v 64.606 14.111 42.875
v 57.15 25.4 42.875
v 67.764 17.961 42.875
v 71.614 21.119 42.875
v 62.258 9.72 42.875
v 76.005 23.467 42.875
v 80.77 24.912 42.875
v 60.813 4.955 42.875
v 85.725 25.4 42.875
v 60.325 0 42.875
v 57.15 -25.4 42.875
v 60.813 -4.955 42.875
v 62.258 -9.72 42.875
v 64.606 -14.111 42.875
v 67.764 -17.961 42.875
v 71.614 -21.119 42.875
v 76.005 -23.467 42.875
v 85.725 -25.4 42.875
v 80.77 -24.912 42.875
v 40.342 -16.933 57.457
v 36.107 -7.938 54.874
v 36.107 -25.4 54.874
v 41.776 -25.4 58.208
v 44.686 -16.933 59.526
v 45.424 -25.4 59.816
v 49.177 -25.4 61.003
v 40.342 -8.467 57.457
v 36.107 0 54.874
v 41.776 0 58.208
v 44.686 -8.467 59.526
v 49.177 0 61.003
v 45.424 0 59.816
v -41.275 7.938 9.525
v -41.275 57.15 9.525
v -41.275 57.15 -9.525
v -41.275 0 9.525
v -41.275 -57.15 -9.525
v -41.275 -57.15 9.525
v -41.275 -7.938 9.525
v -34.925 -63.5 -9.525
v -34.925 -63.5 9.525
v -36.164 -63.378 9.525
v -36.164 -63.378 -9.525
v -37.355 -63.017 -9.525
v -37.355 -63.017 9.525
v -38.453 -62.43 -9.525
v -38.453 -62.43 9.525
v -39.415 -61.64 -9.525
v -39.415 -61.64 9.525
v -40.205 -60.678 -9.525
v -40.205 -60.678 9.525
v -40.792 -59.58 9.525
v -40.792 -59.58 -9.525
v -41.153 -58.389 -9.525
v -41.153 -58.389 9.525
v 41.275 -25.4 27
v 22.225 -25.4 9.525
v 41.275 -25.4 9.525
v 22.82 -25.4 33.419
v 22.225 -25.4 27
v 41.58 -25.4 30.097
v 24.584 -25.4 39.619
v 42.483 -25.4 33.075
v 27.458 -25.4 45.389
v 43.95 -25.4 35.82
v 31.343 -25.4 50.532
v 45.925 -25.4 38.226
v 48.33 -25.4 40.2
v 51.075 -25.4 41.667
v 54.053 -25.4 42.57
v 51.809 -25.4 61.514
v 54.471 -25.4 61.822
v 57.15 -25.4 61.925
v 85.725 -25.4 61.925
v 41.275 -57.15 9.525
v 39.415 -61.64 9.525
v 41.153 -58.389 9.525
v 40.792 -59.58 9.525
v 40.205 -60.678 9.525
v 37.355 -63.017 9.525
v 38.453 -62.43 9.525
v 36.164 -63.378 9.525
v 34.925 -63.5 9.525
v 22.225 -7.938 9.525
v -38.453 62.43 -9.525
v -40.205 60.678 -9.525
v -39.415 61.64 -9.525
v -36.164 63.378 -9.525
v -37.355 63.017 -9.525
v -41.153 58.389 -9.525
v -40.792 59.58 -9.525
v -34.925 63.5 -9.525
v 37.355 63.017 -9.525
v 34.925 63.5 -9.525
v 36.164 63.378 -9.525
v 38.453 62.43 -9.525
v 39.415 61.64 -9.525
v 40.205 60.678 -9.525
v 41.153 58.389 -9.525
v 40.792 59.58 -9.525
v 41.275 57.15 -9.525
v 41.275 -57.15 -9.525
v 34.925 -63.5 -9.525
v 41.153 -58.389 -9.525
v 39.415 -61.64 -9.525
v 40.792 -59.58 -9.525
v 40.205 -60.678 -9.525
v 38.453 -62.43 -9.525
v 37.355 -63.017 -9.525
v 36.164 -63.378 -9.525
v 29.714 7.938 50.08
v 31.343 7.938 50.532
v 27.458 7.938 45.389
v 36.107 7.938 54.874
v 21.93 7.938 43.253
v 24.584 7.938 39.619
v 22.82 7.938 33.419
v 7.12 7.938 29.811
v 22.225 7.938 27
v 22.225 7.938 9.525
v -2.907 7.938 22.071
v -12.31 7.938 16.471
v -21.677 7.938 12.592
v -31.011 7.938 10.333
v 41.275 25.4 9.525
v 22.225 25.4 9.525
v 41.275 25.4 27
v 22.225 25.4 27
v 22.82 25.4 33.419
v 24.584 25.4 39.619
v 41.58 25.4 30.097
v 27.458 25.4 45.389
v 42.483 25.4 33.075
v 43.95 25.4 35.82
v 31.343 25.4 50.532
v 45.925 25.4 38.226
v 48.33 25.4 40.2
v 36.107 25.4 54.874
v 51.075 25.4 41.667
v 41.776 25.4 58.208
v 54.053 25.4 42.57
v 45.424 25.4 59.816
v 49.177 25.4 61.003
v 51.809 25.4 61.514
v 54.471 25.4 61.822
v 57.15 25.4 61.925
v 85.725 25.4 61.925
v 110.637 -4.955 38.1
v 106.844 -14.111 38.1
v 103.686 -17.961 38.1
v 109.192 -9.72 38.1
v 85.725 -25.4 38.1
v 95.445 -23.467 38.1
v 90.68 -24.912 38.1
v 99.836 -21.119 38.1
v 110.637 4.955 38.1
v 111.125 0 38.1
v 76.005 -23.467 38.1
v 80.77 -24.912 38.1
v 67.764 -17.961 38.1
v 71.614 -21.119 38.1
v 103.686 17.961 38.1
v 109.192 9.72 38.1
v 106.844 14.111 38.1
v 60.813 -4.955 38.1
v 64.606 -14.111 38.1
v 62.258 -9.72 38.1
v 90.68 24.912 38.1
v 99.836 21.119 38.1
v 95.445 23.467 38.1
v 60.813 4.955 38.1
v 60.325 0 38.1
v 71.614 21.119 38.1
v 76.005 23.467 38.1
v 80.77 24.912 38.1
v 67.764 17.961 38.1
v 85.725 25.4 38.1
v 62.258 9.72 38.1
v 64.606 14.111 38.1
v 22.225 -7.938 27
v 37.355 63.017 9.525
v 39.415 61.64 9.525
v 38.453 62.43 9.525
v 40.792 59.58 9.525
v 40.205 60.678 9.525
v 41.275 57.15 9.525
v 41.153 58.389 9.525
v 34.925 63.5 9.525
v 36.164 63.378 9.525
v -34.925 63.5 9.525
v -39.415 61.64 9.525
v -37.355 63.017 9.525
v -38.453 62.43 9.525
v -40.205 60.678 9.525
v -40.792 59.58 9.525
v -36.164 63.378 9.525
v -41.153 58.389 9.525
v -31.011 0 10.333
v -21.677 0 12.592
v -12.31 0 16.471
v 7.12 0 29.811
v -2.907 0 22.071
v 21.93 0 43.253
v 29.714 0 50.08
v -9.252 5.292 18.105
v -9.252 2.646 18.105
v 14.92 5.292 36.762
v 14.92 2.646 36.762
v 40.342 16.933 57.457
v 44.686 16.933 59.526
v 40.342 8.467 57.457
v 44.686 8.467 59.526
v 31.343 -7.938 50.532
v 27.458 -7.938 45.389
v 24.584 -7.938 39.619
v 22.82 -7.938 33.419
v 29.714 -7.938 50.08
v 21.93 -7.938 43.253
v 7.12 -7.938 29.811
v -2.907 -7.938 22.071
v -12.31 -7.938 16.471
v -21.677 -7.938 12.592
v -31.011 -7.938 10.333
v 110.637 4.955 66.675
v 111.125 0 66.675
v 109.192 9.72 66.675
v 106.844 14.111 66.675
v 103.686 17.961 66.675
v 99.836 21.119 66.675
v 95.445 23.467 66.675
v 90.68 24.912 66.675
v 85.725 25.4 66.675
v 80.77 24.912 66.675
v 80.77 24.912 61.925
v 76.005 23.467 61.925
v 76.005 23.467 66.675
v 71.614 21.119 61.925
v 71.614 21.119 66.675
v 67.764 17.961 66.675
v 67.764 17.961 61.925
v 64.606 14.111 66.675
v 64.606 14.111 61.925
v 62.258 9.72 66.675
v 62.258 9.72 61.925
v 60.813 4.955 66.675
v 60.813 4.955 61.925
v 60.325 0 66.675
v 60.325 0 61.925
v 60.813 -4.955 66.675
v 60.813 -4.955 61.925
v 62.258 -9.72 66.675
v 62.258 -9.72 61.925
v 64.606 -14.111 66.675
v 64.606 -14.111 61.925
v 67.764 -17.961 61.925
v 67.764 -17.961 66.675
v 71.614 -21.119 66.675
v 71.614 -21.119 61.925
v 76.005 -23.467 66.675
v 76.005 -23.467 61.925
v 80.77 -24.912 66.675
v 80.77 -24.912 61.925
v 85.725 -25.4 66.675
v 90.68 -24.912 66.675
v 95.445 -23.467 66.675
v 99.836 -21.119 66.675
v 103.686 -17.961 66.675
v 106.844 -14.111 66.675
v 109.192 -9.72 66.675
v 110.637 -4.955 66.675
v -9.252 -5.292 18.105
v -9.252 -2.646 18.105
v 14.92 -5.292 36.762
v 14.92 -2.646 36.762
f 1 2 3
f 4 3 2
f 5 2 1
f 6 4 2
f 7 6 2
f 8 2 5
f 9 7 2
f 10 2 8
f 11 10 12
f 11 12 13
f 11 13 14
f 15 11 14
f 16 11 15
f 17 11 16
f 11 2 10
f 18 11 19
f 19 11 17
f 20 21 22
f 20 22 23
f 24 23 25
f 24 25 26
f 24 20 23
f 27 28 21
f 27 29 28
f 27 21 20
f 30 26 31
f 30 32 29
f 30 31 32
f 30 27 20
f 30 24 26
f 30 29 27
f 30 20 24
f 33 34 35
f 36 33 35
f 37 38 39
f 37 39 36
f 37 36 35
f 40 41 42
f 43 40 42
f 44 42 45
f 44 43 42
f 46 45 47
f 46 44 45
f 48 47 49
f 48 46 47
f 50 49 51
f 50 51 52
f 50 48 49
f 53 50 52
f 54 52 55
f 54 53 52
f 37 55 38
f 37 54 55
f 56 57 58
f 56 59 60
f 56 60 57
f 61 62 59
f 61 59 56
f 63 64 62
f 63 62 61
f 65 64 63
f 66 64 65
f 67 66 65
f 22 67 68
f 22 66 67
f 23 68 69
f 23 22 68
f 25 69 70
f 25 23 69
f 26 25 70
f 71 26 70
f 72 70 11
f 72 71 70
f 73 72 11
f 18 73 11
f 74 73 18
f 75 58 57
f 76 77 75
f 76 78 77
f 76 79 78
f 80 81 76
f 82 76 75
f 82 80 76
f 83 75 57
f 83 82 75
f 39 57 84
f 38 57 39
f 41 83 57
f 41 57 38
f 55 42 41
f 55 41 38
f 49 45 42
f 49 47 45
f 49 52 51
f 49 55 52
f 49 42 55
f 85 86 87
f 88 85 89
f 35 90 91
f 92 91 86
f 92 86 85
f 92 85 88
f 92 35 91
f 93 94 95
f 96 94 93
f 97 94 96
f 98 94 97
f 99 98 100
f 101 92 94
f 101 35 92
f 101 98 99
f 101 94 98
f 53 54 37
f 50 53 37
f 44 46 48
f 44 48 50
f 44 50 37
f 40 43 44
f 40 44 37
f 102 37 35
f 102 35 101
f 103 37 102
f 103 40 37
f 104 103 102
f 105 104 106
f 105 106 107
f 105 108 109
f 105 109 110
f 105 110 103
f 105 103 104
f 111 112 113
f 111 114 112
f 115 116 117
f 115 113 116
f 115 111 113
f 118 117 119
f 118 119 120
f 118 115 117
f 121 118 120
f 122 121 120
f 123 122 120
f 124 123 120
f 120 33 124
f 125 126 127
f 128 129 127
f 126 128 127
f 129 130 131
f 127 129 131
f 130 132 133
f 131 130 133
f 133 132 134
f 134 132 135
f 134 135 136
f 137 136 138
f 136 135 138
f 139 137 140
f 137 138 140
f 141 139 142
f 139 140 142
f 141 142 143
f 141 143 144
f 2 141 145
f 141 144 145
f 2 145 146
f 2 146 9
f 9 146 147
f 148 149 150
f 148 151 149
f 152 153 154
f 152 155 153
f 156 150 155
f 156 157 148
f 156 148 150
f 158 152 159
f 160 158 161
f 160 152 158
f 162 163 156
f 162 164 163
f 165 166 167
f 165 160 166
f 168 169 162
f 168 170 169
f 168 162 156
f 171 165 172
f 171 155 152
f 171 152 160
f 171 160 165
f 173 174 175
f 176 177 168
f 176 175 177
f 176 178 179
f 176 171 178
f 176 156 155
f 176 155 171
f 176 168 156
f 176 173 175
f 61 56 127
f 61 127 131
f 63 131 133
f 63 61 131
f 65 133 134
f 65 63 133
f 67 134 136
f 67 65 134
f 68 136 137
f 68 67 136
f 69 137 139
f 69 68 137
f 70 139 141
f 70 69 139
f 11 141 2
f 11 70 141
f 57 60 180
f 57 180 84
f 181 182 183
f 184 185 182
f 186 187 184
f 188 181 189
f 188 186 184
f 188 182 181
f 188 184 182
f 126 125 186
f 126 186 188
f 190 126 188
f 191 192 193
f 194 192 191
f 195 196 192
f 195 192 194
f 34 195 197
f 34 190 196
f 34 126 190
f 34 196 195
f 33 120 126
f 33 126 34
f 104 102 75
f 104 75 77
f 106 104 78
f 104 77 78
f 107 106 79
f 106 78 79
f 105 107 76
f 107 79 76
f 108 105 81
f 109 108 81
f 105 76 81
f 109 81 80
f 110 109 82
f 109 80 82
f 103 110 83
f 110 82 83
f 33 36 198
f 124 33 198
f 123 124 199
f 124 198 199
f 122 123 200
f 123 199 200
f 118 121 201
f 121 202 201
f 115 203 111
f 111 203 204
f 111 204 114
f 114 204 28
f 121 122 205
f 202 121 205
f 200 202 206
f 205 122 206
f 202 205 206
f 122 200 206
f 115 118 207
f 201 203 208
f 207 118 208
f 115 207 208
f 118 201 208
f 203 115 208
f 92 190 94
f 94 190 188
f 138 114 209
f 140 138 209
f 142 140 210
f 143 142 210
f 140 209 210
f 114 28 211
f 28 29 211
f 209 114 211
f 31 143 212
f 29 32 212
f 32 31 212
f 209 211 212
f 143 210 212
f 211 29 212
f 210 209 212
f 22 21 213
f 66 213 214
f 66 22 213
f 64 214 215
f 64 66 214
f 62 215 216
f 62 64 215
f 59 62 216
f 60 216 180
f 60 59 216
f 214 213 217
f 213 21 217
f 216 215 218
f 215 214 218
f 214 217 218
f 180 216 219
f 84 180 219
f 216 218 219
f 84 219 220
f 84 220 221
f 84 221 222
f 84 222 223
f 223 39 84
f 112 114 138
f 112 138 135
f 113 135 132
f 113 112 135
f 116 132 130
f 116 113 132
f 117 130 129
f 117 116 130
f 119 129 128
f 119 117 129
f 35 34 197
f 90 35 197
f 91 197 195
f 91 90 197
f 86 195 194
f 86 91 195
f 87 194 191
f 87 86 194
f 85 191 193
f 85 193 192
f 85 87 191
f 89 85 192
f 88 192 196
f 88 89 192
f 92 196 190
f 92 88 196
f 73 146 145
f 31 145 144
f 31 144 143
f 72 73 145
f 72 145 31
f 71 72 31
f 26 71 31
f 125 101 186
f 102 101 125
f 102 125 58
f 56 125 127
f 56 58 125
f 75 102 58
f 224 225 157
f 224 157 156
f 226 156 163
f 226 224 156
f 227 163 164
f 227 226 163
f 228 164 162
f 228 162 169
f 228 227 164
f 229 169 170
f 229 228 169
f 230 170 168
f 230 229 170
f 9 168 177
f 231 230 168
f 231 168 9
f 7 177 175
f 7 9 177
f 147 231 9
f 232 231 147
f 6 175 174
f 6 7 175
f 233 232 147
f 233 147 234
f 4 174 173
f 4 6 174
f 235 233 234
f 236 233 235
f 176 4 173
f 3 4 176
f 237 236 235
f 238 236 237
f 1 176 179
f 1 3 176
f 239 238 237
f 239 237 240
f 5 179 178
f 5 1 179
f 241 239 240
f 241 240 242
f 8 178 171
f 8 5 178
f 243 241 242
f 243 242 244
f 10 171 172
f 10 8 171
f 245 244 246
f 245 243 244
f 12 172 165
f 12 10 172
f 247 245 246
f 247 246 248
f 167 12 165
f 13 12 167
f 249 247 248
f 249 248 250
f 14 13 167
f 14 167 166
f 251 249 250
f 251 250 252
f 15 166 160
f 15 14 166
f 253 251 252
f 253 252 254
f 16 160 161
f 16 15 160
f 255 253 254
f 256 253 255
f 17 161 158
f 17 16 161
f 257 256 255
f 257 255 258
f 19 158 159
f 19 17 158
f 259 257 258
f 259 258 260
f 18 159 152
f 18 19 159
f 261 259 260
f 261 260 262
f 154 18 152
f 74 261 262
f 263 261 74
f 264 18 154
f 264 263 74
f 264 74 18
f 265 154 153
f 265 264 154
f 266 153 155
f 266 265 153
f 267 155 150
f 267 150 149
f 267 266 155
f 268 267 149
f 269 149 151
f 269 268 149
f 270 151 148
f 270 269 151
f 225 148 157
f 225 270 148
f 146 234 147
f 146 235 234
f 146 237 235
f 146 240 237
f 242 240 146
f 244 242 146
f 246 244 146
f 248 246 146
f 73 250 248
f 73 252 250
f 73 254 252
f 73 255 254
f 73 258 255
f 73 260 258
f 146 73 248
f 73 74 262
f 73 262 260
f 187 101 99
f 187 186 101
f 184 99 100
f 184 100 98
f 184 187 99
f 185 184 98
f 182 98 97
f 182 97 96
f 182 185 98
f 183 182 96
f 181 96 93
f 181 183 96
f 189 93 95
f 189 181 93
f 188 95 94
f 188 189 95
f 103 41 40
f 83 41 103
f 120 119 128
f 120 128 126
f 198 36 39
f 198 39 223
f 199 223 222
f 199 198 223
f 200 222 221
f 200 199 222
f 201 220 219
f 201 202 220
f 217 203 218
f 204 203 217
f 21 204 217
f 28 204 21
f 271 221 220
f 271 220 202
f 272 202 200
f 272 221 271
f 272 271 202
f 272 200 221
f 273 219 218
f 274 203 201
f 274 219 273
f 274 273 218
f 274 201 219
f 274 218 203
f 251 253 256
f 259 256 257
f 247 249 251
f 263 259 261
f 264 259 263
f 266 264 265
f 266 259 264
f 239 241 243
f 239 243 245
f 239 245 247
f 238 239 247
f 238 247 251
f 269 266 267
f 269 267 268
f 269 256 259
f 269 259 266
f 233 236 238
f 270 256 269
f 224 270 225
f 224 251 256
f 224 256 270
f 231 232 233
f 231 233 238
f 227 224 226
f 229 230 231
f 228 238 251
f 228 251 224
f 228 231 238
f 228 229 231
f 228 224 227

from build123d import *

# Parameters (mm, degrees)
F1_DEPTH = 63.5
F0_W     = 25.4
F0_H     = 19.05
F2_DEPTH = 25.4
F3_DEPTH = 7.9375
F5_R     = 6.35


with BuildPart() as f1:
    # F0 (on Front) → F1 (new body, symmetric)
    with BuildSketch(Plane.XZ):
        Polygon((-41.275, 9.525), (-41.275, -9.525), (41.275, -9.525), (41.275, 9.525), (22.225, 9.525), align=None)
    extrude(amount=F1_DEPTH, both=True)

    # F0 (on Front) → F2 (join, symmetric)
    with BuildSketch(Plane.XZ):
        with BuildLine():
            Line((22.225, 9.525), (41.275, 9.525))
            Line((41.275, 9.525), (41.275, 27.0002))
            ThreePointArc((41.275, 27.0002), (45.92468, 38.22552), (57.15, 42.8752))
            Line((57.15, 42.8752), (60.325, 42.8752))
            Line((60.325, 42.8752), (60.325, 61.9252))
            Line((60.325, 61.9252), (57.15, 61.9252))
            ThreePointArc((57.15, 61.9252), (53.137152, 61.693898), (49.177457, 61.003056))
            add(Edge.make_bspline(
                [(36.107399, 54.874284), (40.299297, 57.685987), (44.600471, 59.850046), (49.177457, 61.003056)],
                knots=[85.334769, 85.334769, 85.334769, 85.334769, 102.114273, 102.114273, 102.114273, 102.114273], degree=3))
            ThreePointArc((36.107399, 54.874284), (25.887655, 42.570087), (22.225, 27.0002))
            Line((22.225, 27.0002), (22.225, 9.525))
        make_face()
        with Locations((73.025, 52.4002)):
            Rectangle(F0_W, F0_H)
    extrude(amount=F2_DEPTH, both=True)

    # F0 (on Front) → F3 (join, symmetric)
    with BuildSketch(Plane.XZ):
        with BuildLine():
            add(Edge.make_bspline(
                [(-41.275, 9.525), (-3.70342, 9.525), (14.788851, 40.574934), (36.107399, 54.874284)],
                knots=[0, 0, 0, 0, 85.334769, 85.334769, 85.334769, 85.334769], degree=3))
            Line((-41.275, 9.525), (22.225, 9.525))
            Line((22.225, 9.525), (22.225, 27.0002))
            ThreePointArc((22.225, 27.0002), (25.887655, 42.570087), (36.107399, 54.874284))
        make_face()
    extrude(amount=F3_DEPTH, both=True)

    # F0 (on Front) → F4 (revolve)
    with BuildSketch(Plane.XZ):
        Polygon((85.725, 61.9252), (85.725, 42.8752), (85.725, 38.1), (111.125, 38.1), (111.125, 66.675), (85.725, 66.675), align=None)
    revolve(axis=Axis((85.725, 0, 52.4002), (0, 0, 1)))

    # F5
    f5_edges = [f1.edges().sort_by_distance(p)[0] for p in [
        (-41.275, -63.5, 0),
        (41.275, -63.5, 0),
        (-41.275, 63.5, 0),
        (41.275, 63.5, 0),
    ]]
    fillet(f5_edges, radius=F5_R)


solid = f1.part
